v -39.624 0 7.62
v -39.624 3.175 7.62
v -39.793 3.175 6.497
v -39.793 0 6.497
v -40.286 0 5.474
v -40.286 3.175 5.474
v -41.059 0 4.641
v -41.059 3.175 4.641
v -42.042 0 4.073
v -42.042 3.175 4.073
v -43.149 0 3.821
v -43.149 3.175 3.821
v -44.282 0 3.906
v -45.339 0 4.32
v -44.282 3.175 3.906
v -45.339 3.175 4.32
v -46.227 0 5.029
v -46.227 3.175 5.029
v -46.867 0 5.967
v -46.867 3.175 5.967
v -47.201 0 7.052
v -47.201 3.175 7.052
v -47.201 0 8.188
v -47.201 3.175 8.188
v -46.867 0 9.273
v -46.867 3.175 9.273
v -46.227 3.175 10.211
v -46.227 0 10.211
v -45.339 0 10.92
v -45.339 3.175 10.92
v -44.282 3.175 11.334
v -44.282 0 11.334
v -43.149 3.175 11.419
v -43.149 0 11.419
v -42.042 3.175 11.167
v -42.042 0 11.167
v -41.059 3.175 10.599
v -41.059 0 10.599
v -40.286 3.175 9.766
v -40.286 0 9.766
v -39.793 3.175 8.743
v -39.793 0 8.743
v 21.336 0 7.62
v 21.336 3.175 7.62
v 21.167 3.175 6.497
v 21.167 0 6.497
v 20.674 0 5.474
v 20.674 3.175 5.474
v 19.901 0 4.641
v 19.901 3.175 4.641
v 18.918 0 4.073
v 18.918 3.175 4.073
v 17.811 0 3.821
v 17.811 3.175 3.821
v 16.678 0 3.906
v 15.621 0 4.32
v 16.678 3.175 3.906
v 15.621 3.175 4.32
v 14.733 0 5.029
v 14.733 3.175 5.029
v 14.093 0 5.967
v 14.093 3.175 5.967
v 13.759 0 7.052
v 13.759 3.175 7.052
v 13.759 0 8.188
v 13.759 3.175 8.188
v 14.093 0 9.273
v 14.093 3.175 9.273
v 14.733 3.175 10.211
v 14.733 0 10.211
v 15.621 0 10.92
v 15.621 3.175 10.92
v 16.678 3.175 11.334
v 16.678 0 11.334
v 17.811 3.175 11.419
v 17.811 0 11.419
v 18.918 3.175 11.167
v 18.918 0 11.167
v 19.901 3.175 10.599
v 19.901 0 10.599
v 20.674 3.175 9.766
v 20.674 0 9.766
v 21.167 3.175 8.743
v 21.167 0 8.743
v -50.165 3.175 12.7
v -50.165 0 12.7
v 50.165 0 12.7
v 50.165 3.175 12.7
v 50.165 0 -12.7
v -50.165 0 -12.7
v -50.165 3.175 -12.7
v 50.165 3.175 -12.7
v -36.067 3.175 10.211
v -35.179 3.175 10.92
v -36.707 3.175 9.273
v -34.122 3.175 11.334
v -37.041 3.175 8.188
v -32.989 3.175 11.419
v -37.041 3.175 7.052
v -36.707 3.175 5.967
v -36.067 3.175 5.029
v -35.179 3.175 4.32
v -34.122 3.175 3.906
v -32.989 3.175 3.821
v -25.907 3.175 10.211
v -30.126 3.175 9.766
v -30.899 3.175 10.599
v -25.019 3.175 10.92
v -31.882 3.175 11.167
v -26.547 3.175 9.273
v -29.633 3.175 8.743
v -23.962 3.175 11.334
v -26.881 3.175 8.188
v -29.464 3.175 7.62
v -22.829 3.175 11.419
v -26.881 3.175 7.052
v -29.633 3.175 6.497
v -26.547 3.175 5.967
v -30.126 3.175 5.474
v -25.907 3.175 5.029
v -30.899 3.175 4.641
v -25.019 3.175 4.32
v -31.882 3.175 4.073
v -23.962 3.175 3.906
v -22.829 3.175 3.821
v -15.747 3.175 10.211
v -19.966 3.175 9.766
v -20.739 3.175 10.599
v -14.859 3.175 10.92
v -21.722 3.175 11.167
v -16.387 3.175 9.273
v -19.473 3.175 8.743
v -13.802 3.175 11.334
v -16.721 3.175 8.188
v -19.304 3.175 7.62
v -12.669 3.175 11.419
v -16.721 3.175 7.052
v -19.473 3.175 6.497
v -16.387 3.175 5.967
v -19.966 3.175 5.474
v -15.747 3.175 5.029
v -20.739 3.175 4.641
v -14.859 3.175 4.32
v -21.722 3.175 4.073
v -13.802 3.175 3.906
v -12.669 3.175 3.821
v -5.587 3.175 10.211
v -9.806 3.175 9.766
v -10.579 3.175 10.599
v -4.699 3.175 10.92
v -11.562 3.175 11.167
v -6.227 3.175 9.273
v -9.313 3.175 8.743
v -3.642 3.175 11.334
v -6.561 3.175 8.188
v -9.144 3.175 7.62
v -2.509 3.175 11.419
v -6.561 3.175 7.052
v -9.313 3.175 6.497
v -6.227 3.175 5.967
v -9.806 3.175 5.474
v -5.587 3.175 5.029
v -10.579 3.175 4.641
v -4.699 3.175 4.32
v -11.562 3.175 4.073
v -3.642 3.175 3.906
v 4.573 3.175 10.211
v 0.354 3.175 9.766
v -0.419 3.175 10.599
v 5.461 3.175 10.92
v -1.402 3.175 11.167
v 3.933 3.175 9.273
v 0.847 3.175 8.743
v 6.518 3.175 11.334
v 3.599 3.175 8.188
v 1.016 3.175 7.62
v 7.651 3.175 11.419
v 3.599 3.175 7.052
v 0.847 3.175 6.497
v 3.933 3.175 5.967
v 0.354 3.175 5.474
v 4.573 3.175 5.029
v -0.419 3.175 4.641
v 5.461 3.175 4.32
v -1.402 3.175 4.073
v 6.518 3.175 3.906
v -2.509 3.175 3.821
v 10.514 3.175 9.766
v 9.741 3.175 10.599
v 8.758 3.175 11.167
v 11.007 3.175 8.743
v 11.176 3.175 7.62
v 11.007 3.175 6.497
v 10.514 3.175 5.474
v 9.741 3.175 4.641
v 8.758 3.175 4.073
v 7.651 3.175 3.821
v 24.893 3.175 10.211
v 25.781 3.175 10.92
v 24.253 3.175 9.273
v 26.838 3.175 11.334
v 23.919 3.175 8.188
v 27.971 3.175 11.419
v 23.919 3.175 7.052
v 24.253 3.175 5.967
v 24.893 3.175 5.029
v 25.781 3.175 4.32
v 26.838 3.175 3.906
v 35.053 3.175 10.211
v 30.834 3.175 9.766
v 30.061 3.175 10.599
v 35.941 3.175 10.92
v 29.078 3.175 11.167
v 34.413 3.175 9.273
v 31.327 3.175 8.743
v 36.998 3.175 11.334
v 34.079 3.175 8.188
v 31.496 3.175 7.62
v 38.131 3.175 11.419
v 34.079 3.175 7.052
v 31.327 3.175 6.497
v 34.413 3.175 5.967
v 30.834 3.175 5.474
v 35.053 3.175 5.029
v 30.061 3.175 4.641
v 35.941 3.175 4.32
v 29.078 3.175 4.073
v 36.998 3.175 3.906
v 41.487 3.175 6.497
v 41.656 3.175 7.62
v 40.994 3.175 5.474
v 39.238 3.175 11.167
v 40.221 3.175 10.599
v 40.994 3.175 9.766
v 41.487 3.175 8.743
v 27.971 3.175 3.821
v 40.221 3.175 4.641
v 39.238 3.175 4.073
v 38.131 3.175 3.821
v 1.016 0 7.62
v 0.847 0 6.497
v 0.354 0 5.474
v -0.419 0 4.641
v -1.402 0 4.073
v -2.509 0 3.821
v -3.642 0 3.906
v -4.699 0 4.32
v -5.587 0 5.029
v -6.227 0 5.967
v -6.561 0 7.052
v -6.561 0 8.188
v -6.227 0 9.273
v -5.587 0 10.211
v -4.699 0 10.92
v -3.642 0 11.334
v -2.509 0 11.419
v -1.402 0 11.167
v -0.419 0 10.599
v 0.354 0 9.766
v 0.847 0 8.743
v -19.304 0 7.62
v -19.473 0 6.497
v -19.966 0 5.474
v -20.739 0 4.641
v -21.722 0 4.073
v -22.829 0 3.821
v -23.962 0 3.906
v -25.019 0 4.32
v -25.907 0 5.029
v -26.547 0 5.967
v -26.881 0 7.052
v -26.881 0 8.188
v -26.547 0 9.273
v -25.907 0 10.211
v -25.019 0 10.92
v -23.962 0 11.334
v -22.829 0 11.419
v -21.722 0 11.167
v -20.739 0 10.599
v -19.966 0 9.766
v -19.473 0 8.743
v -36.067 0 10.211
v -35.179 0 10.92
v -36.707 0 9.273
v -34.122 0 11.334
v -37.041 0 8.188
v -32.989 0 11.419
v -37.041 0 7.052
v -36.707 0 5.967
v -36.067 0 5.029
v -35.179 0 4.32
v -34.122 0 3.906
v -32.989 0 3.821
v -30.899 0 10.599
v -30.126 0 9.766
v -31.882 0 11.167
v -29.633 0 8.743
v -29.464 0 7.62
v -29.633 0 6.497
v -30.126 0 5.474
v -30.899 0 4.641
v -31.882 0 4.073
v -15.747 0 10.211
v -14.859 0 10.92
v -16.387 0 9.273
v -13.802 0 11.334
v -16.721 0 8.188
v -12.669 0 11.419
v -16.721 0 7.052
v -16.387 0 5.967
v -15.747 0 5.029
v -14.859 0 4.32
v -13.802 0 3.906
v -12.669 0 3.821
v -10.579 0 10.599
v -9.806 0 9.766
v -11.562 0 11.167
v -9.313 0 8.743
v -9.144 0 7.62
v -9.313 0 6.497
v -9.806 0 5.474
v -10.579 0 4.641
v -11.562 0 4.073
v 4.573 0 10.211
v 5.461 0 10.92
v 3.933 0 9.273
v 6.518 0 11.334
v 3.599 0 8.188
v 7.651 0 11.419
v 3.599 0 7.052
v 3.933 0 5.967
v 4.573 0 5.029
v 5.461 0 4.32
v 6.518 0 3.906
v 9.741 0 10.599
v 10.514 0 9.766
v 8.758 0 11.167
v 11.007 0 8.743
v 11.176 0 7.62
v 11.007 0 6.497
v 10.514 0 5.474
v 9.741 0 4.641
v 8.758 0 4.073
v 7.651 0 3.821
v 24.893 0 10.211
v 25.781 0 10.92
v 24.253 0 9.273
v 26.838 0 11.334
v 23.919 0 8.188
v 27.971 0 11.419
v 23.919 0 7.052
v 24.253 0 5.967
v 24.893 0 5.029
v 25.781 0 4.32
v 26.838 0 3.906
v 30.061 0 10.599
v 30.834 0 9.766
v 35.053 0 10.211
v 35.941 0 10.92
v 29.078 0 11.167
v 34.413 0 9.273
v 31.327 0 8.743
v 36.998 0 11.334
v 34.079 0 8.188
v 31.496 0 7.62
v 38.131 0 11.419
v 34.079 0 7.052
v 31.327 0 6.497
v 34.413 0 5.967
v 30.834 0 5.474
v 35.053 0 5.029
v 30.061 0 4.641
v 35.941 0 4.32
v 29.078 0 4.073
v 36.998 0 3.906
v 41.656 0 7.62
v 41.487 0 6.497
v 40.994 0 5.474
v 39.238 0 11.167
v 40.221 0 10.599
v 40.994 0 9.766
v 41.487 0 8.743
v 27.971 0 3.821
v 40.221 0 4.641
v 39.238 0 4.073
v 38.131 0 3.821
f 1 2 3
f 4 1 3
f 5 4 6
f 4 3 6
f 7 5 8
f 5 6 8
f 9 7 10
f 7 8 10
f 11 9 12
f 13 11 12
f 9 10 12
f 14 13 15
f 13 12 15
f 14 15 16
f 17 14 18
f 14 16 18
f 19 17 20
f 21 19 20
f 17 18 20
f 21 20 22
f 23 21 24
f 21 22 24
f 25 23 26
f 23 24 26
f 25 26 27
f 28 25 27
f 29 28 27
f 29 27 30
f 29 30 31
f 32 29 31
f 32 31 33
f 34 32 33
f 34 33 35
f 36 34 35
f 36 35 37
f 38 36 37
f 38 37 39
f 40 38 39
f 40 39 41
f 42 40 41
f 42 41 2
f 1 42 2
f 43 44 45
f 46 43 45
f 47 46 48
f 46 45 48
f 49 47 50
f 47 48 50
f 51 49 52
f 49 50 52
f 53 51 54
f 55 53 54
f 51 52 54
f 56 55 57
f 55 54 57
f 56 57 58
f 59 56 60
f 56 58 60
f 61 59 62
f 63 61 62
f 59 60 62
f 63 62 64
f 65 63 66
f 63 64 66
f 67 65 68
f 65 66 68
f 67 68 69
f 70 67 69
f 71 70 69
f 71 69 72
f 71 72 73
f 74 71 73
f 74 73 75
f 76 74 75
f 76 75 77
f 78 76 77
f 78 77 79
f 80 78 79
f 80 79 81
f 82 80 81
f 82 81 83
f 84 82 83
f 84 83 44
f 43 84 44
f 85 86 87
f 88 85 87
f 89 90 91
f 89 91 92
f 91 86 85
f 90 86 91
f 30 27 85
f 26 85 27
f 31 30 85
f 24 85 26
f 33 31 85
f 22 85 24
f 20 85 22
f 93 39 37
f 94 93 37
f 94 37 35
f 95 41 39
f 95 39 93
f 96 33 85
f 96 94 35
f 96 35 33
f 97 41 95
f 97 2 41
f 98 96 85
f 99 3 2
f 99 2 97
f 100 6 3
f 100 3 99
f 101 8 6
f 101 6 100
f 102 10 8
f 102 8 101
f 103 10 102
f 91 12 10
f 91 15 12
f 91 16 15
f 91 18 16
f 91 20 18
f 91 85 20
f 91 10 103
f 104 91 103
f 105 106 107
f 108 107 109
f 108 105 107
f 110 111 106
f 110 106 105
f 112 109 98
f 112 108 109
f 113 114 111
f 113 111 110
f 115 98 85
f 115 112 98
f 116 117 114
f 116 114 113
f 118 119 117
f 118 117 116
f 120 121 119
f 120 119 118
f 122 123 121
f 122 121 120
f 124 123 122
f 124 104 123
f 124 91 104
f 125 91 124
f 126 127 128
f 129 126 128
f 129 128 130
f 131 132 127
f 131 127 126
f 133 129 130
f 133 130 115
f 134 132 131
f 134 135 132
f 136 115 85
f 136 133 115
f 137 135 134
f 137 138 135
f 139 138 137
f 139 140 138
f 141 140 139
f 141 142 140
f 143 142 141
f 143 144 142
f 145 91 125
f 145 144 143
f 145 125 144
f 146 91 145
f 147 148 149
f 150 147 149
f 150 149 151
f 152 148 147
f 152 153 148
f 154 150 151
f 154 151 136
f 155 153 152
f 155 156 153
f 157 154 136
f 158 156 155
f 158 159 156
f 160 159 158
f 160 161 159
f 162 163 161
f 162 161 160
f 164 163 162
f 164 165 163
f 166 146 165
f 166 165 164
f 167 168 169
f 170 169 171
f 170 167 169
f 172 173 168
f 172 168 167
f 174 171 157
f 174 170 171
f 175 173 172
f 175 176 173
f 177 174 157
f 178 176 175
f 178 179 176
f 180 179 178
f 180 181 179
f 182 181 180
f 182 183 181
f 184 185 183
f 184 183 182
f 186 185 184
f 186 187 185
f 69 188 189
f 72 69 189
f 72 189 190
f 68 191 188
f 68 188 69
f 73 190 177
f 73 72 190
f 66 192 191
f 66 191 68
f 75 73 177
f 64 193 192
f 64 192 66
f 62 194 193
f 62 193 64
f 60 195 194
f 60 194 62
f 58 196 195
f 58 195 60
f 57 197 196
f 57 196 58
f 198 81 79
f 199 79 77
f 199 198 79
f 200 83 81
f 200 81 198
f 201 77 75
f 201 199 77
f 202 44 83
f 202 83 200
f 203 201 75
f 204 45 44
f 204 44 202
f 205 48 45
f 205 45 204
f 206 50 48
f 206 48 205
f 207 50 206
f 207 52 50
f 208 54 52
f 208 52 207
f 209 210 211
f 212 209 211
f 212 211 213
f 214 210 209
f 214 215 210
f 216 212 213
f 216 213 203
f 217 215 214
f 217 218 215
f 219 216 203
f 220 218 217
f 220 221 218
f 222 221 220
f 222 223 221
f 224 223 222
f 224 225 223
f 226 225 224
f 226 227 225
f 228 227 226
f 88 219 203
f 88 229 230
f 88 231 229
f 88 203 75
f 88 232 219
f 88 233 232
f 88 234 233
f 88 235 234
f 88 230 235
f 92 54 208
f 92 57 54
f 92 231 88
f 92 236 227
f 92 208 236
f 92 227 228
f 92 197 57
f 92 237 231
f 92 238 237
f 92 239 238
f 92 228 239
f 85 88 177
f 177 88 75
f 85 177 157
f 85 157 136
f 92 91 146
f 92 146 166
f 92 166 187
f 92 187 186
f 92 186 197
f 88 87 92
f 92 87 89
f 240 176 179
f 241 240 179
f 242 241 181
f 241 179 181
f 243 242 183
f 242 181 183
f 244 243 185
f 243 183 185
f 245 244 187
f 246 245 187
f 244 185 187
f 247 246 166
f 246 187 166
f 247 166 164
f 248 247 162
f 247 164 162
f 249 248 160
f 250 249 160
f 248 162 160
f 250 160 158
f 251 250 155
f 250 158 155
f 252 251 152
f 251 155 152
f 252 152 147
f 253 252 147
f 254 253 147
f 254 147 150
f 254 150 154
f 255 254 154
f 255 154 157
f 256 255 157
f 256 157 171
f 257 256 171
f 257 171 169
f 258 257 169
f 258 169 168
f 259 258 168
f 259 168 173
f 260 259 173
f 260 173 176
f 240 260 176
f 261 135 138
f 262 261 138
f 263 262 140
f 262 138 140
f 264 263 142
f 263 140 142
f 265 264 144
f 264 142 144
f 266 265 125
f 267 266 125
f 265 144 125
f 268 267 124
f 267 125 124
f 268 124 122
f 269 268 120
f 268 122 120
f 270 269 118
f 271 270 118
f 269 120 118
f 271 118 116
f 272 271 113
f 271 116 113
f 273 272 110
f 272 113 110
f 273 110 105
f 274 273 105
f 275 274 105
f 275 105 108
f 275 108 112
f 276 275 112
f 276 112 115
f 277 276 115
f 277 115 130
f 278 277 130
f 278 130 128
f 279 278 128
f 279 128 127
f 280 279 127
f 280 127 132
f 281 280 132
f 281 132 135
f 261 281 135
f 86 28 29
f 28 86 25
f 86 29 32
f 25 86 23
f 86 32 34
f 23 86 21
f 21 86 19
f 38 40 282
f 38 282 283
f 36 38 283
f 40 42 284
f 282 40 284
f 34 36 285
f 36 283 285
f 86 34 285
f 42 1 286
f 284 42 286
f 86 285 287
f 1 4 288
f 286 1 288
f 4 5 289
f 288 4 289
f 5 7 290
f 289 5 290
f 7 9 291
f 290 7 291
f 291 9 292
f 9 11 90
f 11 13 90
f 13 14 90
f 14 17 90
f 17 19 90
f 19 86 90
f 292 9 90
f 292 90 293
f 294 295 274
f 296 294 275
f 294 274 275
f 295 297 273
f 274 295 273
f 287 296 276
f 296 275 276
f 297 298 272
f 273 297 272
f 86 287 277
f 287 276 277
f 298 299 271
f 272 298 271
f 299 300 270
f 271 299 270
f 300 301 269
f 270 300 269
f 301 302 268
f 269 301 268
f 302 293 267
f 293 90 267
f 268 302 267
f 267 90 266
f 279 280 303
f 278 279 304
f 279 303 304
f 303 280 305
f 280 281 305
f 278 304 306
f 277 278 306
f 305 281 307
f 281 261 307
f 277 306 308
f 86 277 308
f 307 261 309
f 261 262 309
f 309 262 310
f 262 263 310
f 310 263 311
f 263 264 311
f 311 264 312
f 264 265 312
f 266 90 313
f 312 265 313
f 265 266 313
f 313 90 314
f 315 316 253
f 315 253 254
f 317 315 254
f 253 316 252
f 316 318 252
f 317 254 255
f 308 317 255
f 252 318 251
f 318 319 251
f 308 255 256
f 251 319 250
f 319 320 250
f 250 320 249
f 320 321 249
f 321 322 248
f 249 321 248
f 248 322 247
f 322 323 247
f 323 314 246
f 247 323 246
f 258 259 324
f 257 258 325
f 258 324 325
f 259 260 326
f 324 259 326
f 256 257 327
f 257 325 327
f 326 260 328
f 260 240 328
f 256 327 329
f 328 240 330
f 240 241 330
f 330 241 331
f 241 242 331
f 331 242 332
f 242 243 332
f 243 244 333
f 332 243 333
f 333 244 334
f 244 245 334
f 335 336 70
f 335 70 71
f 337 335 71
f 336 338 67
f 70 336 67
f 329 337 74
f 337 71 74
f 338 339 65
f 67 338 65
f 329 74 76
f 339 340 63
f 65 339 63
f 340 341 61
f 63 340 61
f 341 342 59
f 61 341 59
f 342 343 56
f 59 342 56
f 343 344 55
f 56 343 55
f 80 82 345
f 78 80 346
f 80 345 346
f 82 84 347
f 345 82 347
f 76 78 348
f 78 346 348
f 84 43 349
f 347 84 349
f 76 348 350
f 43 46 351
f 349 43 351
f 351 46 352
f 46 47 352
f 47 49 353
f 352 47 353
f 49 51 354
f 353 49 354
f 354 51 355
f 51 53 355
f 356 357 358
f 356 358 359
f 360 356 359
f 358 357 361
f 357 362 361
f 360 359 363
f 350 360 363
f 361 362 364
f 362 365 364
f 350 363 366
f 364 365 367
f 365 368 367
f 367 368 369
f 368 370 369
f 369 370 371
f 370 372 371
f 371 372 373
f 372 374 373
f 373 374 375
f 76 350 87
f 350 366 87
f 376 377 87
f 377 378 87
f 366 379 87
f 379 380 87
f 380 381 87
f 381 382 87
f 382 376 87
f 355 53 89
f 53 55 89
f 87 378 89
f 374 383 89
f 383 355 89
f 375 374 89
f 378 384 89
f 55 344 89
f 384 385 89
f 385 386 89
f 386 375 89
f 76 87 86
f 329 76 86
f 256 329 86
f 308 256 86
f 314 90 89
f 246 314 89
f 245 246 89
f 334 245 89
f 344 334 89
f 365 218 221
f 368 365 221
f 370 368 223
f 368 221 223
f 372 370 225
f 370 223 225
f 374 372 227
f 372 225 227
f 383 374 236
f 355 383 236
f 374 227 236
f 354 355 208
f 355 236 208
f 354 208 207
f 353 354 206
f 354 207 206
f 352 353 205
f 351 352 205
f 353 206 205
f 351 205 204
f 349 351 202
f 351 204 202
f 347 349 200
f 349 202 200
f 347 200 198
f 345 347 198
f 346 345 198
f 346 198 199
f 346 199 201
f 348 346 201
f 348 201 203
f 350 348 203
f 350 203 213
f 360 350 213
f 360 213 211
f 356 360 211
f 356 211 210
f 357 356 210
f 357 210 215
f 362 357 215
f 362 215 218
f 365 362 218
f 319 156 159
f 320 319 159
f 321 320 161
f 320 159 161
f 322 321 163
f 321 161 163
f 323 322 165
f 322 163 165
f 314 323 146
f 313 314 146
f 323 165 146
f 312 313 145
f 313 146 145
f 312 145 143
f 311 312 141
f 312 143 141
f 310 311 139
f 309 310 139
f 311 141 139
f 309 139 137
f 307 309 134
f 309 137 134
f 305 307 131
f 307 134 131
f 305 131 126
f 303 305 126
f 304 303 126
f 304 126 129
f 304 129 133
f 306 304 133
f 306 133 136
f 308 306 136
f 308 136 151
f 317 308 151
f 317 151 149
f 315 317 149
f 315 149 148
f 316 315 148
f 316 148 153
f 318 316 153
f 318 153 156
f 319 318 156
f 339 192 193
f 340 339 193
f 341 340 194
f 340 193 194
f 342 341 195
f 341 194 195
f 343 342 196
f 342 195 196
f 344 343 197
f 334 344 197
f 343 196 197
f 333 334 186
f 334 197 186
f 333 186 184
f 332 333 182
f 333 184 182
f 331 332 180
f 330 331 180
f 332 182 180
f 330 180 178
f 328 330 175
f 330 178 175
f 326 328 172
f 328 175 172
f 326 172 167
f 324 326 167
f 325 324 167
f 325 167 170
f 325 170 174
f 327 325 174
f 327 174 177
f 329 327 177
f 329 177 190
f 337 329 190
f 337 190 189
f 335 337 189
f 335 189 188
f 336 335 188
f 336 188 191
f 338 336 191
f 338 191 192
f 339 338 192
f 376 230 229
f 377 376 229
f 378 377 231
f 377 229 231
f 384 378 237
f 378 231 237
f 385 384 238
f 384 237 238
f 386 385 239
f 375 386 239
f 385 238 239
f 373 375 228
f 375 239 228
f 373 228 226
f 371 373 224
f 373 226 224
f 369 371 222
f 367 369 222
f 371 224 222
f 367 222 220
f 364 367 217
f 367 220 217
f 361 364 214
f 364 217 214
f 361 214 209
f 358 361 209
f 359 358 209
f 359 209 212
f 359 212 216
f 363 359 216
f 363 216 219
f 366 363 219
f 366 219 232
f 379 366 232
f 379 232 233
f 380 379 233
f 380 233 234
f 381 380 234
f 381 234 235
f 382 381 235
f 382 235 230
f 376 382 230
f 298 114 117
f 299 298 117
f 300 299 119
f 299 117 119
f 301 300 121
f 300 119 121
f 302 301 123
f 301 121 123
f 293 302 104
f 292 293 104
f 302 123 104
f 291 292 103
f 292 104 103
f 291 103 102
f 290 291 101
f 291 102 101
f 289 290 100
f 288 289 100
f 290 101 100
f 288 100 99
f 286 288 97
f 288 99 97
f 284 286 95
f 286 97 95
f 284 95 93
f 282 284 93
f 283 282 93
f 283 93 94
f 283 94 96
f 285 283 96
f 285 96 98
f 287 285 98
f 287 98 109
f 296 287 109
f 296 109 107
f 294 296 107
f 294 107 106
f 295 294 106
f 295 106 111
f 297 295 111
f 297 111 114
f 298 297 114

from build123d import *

# Parameters (mm, degrees)
SKETCH2_W           = 100.33
SKETCH2_H           = 25.4
BOSS_EXTRUDE1_DEPTH = 3.175
SKETCH3_R           = 3.81
CUT_EXTRUDE1_DEPTH  = 4.175


with BuildPart() as part:
    # Sketch2 → Boss-Extrude1 (new body)
    with BuildSketch(Plane(origin=(0, 0, 0), x_dir=(1, 0, 0), z_dir=(0, 1, 0))):
        Rectangle(SKETCH2_W, SKETCH2_H)
    extrude(amount=BOSS_EXTRUDE1_DEPTH)

    # Sketch3 → Cut-Extrude1 (cut, through all)
    with BuildSketch(Plane(origin=(0, 3.175, 0), x_dir=(1, 0, 0), z_dir=(0, 1, 0))):
        with Locations((-43.434, -7.62)):
            Circle(SKETCH3_R)
        with Locations((-33.274, -7.62)):
            Circle(SKETCH3_R)
        with Locations((-23.114, -7.62)):
            Circle(SKETCH3_R)
        with Locations((-12.954, -7.62)):
            Circle(SKETCH3_R)
        with Locations((-2.794, -7.62)):
            Circle(SKETCH3_R)
        with Locations((7.366, -7.62)):
            Circle(SKETCH3_R)
        with Locations((17.526, -7.62)):
            Circle(SKETCH3_R)
        with Locations((27.686, -7.62)):
            Circle(SKETCH3_R)
        with Locations((37.846, -7.62)):
            Circle(SKETCH3_R)
    extrude(amount=-CUT_EXTRUDE1_DEPTH, mode=Mode.SUBTRACT)


solid = part.part
